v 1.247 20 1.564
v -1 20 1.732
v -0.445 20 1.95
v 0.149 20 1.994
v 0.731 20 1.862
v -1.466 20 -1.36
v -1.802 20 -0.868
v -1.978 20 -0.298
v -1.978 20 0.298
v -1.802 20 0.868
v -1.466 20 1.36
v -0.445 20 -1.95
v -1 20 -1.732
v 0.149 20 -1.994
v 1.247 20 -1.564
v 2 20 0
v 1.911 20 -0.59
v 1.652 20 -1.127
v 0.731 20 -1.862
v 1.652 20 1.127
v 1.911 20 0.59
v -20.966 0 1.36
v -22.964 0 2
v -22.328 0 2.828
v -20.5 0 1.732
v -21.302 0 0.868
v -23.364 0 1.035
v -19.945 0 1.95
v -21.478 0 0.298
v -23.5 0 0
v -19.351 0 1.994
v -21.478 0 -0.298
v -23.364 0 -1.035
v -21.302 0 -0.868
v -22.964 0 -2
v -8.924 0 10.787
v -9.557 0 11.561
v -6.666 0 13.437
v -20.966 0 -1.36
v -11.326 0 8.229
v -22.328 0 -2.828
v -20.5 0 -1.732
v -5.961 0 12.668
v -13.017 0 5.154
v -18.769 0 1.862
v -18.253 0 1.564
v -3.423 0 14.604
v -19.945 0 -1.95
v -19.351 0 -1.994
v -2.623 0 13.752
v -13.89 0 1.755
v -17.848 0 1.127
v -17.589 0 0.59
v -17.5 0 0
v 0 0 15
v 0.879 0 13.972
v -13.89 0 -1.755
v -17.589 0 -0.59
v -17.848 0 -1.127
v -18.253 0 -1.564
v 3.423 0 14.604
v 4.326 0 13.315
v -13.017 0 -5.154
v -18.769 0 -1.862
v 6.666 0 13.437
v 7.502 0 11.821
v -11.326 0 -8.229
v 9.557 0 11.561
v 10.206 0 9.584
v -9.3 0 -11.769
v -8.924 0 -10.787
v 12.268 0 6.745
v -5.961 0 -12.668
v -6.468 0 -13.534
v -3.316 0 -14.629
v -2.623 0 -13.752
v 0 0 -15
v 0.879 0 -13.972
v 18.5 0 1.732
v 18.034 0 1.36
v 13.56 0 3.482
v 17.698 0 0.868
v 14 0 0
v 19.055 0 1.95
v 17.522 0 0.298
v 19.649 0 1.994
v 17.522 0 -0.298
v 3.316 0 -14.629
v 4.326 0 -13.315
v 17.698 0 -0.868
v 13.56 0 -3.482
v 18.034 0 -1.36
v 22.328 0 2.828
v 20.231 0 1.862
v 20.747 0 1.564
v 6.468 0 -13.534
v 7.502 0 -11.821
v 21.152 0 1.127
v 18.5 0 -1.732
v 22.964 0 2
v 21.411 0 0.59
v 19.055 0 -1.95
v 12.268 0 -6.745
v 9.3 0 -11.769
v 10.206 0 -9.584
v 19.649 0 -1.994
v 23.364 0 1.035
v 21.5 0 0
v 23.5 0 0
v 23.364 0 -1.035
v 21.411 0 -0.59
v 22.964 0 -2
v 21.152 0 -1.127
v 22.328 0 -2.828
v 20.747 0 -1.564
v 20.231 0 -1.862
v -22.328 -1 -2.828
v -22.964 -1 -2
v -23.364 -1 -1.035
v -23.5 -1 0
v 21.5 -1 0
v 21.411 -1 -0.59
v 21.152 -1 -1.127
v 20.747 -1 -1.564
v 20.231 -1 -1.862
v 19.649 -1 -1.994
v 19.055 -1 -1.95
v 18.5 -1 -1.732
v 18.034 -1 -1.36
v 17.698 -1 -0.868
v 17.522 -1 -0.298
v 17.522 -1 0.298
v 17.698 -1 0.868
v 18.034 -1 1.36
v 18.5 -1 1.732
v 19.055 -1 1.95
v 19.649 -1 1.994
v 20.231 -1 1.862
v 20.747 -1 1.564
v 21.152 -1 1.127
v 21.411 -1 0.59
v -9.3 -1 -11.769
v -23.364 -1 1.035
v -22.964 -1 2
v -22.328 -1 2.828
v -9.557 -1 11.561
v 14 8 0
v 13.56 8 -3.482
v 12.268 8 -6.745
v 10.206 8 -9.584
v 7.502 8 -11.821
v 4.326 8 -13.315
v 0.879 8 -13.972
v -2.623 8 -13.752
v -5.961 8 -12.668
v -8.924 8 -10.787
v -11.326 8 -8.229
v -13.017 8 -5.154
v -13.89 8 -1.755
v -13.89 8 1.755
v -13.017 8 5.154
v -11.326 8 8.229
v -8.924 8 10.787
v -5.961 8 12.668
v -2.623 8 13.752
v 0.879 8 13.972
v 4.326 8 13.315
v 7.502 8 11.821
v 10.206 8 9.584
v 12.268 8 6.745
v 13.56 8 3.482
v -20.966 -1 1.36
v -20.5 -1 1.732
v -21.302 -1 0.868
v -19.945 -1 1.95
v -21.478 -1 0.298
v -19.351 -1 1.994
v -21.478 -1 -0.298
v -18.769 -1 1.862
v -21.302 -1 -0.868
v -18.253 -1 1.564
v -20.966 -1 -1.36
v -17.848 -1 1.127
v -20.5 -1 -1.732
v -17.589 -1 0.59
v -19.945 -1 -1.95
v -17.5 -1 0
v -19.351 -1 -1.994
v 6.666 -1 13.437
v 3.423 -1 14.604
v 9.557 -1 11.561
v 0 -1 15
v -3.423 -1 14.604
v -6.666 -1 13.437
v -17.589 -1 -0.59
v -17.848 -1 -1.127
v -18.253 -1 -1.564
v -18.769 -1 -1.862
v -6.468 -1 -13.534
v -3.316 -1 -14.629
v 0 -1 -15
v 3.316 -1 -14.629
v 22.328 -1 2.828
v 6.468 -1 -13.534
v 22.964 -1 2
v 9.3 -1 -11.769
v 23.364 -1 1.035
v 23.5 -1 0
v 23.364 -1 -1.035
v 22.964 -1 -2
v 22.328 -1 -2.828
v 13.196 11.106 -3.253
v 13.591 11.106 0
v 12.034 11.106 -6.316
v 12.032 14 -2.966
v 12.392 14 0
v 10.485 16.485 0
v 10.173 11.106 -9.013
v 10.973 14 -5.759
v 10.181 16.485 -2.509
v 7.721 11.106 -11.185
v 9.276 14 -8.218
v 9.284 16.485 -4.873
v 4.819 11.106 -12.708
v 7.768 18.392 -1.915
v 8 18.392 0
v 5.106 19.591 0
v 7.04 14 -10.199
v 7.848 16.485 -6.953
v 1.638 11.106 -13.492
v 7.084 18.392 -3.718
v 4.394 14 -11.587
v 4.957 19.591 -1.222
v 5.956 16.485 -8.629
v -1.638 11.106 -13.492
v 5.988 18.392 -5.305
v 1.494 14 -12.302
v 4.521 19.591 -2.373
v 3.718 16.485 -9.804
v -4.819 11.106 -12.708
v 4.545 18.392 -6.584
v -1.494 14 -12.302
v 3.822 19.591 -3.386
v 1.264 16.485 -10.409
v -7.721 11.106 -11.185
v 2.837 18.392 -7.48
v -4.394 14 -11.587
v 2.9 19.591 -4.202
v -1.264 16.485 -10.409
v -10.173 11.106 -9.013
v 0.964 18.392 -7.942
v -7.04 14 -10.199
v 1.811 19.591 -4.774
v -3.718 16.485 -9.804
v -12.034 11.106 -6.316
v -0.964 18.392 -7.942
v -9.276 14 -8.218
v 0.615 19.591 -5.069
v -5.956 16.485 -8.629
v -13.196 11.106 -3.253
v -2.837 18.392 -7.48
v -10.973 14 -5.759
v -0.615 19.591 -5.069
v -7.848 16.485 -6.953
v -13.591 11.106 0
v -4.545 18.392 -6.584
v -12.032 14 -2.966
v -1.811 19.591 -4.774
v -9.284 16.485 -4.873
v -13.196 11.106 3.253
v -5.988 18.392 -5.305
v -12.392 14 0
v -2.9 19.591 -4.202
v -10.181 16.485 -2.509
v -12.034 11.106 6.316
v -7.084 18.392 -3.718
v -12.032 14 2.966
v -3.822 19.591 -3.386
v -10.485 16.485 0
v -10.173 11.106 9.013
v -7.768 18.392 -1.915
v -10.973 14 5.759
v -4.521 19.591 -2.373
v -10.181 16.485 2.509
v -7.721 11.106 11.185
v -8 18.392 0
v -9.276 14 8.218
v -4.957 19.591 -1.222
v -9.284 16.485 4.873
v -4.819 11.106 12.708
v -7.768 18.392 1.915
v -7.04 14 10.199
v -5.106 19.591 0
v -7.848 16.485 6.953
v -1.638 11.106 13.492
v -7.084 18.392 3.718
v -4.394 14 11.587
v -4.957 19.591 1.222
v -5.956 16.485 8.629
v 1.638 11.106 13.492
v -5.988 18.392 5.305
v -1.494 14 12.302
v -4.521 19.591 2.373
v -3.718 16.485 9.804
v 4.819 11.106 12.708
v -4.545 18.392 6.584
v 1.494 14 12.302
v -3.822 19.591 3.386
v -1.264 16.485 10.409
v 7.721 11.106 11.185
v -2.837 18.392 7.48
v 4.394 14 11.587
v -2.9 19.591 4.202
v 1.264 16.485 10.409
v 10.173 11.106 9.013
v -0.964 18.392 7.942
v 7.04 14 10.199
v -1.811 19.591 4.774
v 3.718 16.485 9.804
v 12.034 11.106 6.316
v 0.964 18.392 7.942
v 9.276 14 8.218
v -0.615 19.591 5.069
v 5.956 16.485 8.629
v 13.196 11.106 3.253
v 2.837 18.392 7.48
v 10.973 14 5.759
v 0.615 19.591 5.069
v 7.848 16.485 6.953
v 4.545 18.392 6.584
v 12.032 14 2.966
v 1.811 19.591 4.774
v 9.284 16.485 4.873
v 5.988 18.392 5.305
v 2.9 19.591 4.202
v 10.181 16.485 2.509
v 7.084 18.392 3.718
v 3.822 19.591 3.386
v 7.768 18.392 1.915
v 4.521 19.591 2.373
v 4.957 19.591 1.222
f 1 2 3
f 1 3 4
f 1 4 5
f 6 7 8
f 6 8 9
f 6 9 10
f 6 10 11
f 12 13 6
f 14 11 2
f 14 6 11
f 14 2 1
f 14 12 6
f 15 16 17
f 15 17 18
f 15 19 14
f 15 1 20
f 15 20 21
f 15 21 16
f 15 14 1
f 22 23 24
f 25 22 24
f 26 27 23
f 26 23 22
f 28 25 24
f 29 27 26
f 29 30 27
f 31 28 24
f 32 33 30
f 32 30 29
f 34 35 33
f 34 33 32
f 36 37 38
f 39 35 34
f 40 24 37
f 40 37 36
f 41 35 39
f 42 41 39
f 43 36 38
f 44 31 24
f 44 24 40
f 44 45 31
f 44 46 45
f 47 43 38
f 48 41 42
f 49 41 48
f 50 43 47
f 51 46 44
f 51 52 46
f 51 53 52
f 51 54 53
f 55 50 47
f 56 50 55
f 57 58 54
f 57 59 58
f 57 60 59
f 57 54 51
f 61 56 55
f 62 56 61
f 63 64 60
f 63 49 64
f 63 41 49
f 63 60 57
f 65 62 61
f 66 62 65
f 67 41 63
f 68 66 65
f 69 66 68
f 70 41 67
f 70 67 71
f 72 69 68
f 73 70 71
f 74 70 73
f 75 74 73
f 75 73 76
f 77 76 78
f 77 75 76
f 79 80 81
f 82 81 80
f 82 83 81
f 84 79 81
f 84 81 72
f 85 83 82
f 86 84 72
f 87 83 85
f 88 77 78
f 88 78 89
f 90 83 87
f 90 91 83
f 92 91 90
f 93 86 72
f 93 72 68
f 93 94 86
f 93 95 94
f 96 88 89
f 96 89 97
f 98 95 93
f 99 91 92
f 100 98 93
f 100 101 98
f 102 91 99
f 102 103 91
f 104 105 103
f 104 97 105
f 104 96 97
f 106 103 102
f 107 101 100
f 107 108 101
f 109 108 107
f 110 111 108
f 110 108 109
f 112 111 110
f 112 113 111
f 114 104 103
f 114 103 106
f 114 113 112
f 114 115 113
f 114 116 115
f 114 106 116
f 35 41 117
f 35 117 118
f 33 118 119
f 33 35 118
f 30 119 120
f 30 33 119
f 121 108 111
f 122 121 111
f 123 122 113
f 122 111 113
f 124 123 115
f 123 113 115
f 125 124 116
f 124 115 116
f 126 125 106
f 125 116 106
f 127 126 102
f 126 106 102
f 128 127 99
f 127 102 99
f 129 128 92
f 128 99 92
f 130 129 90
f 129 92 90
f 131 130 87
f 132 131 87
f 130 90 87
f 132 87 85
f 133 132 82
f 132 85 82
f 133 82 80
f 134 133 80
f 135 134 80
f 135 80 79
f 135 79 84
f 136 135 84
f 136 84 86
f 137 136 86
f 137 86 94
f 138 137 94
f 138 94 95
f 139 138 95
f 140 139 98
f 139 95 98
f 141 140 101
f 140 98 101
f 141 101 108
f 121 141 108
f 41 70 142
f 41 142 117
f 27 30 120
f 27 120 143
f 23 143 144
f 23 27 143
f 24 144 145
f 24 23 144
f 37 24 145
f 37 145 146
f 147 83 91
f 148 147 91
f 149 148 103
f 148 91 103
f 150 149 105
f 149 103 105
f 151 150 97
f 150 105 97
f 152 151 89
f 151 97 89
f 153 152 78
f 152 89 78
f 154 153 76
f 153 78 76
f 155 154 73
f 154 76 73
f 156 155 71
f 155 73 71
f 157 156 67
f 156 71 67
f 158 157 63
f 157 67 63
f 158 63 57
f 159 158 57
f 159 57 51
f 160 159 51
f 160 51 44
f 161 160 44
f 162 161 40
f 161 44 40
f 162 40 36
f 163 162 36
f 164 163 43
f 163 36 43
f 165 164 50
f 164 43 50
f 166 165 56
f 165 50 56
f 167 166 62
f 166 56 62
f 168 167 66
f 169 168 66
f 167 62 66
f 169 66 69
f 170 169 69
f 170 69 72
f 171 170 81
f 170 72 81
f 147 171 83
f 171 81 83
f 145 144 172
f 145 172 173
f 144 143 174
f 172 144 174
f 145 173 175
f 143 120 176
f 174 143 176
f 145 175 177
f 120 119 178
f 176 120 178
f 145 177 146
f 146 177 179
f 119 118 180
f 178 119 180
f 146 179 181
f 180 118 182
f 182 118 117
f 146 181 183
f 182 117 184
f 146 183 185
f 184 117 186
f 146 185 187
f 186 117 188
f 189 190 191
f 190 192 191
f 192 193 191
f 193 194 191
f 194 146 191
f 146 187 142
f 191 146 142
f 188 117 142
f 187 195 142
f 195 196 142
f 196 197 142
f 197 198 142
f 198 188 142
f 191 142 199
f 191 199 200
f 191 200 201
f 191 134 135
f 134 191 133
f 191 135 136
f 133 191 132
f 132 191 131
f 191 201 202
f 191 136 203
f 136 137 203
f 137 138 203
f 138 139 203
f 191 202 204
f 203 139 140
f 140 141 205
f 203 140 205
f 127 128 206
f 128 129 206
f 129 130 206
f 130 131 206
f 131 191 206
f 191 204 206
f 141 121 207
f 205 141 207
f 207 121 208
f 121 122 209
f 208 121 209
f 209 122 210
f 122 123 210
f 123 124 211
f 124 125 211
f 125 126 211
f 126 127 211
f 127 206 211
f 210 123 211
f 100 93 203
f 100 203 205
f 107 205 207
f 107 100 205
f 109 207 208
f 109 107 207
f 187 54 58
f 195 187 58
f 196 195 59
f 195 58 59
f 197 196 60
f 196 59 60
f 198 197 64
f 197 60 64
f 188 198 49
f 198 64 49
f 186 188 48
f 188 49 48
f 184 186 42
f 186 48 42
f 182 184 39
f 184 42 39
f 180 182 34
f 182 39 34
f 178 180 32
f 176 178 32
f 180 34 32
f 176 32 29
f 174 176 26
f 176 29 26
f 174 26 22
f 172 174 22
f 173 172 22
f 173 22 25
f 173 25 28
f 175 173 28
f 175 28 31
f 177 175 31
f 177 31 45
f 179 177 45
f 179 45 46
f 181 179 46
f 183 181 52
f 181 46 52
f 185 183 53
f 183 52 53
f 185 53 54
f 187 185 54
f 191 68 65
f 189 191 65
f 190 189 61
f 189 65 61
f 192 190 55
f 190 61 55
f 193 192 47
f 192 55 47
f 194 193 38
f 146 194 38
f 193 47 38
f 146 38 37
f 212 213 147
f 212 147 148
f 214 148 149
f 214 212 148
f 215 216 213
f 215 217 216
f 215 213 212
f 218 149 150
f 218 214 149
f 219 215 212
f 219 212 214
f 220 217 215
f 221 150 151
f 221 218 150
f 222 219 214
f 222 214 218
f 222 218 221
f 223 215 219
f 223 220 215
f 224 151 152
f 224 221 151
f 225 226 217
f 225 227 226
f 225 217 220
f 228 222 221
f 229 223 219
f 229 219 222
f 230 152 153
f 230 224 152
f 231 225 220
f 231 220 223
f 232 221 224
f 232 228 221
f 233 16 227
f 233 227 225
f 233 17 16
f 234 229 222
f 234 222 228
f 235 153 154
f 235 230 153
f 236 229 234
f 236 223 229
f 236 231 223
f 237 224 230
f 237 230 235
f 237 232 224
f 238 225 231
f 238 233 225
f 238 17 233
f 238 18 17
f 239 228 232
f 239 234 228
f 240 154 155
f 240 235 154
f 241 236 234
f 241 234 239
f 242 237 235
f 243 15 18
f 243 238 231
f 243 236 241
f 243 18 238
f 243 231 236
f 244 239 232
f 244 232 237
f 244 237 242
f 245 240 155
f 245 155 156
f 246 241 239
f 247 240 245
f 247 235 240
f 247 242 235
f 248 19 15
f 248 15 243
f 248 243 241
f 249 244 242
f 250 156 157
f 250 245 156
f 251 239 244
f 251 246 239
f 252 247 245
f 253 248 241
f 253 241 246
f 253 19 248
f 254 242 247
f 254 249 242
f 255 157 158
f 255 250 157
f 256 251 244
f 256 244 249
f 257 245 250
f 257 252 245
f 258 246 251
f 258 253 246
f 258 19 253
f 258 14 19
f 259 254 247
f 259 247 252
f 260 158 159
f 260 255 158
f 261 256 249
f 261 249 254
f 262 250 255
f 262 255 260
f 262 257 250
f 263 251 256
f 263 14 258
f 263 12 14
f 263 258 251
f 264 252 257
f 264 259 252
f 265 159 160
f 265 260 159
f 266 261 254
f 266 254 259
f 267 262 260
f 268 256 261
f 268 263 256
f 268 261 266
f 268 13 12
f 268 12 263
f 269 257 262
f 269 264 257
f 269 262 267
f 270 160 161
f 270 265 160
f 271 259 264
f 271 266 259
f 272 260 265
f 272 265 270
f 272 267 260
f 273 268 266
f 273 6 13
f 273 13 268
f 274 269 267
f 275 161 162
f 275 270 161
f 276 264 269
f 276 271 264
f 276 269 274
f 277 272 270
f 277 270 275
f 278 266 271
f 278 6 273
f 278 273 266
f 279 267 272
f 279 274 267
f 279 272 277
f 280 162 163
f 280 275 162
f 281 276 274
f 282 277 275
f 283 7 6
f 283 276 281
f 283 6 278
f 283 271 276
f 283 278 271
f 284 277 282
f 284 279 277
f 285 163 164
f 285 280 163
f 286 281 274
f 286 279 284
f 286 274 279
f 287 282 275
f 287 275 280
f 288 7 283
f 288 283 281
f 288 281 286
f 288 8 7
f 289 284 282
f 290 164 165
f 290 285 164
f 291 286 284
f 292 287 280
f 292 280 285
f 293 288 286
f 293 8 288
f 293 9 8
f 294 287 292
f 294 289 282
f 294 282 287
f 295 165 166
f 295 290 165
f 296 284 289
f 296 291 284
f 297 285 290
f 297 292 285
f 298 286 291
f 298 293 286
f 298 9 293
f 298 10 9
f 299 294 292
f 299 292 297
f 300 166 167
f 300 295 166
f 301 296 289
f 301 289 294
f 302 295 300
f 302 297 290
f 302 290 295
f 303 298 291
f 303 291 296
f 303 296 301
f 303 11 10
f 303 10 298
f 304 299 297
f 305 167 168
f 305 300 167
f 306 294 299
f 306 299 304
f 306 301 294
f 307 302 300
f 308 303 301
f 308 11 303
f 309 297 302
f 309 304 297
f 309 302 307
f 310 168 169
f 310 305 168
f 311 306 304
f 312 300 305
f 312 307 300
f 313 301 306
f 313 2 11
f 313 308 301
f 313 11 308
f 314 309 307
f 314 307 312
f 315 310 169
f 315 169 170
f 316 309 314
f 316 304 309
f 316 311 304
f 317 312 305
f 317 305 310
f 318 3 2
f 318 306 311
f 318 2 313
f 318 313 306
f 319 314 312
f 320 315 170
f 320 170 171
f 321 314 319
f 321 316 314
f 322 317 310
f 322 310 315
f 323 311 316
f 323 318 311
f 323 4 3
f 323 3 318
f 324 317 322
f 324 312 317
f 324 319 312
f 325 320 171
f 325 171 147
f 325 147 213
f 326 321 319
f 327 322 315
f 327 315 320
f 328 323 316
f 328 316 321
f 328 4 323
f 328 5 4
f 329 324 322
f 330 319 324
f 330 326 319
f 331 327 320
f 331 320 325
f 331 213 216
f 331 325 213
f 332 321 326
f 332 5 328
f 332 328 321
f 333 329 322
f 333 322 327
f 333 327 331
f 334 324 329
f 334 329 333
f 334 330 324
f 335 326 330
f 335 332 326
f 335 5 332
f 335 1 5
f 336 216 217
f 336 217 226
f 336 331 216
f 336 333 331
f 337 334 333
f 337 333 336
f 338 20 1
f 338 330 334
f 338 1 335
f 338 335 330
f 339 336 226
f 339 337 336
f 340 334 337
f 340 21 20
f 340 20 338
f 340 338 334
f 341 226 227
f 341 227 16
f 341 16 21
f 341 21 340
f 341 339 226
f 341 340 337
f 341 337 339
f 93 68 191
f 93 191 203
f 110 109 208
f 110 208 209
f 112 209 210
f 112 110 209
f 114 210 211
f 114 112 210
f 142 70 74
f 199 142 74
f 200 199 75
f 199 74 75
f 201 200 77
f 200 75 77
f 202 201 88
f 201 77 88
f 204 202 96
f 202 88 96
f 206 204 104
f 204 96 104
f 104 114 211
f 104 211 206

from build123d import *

# Parameters (mm, degrees)
SKETCH1_R           = 14
BOSS_EXTRUDE1_DEPTH = 20
FILLET_1_R          = 12
SKETCH2_R           = 15
BOSS_EXTRUDE2_DEPTH = 1
SKETCH3_R           = 2
BOSS_EXTRUDE3_DEPTH = 1


with BuildPart() as part:
    # Sketch1 → Boss-Extrude1 (new body)
    with BuildSketch(Plane(origin=(0, 0, 0), x_dir=(1, 0, 0), z_dir=(0, 1, 0))):
        Circle(SKETCH1_R)
    extrude(amount=BOSS_EXTRUDE1_DEPTH)

    # Fillet 1
    fillet_1_edges = [part.edges().sort_by_distance(p)[0] for p in [
        (-14, 20, 0),
    ]]
    fillet(fillet_1_edges, radius=FILLET_1_R)

    # Sketch2 → Boss-Extrude2 (add)
    with BuildSketch(Plane(origin=(0, 0, 0), x_dir=(-1, 0, 0), z_dir=(0, -1, 0))):
        Circle(SKETCH2_R)
    extrude(amount=BOSS_EXTRUDE2_DEPTH)

    # Sketch3 → Boss-Extrude3 (add)
    with BuildSketch(Plane(origin=(0, 0, 0), x_dir=(1, 0, 0), z_dir=(0, 1, 0))):
        with BuildLine():
            Line((-9.300297681, 11.768791911), (-22.328427125, 2.828427125))
            ThreePointArc((-22.328427125, 2.828427125), (-23.19551813, 1.530733729), (-23.5, 0))
            ThreePointArc((-23.5, 0), (-23.19551813, -1.530733729), (-22.328427125, -2.828427125))
            Line((-22.328427125, -2.828427125), (-9.556823766, -11.561449714))
            ThreePointArc((-9.556823766, -11.561449714), (-14.999093336, 0.164921511), (-9.300297681, 11.768791911))
        make_face()
        with Locations((-19.5, 0)):
            Circle(SKETCH3_R, mode=Mode.SUBTRACT)
        with BuildLine():
            Line((22.328427125, 2.828427125), (9.300297681, 11.768791911))
            ThreePointArc((9.300297681, 11.768791911), (13.500082689, 6.538177681), (15, 0))
            ThreePointArc((15, 0), (13.571152429, -6.389352217), (9.556823766, -11.561449714))
            Line((9.556823766, -11.561449714), (22.328427125, -2.828427125))
            ThreePointArc((22.328427125, -2.828427125), (23.19551813, -1.530733729), (23.5, 0))
            ThreePointArc((23.5, 0), (23.19551813, 1.530733729), (22.328427125, 2.828427125))
        make_face()
        with Locations((19.5, 0)):
            Circle(SKETCH3_R, mode=Mode.SUBTRACT)
    extrude(amount=-BOSS_EXTRUDE3_DEPTH)


solid = part.part
